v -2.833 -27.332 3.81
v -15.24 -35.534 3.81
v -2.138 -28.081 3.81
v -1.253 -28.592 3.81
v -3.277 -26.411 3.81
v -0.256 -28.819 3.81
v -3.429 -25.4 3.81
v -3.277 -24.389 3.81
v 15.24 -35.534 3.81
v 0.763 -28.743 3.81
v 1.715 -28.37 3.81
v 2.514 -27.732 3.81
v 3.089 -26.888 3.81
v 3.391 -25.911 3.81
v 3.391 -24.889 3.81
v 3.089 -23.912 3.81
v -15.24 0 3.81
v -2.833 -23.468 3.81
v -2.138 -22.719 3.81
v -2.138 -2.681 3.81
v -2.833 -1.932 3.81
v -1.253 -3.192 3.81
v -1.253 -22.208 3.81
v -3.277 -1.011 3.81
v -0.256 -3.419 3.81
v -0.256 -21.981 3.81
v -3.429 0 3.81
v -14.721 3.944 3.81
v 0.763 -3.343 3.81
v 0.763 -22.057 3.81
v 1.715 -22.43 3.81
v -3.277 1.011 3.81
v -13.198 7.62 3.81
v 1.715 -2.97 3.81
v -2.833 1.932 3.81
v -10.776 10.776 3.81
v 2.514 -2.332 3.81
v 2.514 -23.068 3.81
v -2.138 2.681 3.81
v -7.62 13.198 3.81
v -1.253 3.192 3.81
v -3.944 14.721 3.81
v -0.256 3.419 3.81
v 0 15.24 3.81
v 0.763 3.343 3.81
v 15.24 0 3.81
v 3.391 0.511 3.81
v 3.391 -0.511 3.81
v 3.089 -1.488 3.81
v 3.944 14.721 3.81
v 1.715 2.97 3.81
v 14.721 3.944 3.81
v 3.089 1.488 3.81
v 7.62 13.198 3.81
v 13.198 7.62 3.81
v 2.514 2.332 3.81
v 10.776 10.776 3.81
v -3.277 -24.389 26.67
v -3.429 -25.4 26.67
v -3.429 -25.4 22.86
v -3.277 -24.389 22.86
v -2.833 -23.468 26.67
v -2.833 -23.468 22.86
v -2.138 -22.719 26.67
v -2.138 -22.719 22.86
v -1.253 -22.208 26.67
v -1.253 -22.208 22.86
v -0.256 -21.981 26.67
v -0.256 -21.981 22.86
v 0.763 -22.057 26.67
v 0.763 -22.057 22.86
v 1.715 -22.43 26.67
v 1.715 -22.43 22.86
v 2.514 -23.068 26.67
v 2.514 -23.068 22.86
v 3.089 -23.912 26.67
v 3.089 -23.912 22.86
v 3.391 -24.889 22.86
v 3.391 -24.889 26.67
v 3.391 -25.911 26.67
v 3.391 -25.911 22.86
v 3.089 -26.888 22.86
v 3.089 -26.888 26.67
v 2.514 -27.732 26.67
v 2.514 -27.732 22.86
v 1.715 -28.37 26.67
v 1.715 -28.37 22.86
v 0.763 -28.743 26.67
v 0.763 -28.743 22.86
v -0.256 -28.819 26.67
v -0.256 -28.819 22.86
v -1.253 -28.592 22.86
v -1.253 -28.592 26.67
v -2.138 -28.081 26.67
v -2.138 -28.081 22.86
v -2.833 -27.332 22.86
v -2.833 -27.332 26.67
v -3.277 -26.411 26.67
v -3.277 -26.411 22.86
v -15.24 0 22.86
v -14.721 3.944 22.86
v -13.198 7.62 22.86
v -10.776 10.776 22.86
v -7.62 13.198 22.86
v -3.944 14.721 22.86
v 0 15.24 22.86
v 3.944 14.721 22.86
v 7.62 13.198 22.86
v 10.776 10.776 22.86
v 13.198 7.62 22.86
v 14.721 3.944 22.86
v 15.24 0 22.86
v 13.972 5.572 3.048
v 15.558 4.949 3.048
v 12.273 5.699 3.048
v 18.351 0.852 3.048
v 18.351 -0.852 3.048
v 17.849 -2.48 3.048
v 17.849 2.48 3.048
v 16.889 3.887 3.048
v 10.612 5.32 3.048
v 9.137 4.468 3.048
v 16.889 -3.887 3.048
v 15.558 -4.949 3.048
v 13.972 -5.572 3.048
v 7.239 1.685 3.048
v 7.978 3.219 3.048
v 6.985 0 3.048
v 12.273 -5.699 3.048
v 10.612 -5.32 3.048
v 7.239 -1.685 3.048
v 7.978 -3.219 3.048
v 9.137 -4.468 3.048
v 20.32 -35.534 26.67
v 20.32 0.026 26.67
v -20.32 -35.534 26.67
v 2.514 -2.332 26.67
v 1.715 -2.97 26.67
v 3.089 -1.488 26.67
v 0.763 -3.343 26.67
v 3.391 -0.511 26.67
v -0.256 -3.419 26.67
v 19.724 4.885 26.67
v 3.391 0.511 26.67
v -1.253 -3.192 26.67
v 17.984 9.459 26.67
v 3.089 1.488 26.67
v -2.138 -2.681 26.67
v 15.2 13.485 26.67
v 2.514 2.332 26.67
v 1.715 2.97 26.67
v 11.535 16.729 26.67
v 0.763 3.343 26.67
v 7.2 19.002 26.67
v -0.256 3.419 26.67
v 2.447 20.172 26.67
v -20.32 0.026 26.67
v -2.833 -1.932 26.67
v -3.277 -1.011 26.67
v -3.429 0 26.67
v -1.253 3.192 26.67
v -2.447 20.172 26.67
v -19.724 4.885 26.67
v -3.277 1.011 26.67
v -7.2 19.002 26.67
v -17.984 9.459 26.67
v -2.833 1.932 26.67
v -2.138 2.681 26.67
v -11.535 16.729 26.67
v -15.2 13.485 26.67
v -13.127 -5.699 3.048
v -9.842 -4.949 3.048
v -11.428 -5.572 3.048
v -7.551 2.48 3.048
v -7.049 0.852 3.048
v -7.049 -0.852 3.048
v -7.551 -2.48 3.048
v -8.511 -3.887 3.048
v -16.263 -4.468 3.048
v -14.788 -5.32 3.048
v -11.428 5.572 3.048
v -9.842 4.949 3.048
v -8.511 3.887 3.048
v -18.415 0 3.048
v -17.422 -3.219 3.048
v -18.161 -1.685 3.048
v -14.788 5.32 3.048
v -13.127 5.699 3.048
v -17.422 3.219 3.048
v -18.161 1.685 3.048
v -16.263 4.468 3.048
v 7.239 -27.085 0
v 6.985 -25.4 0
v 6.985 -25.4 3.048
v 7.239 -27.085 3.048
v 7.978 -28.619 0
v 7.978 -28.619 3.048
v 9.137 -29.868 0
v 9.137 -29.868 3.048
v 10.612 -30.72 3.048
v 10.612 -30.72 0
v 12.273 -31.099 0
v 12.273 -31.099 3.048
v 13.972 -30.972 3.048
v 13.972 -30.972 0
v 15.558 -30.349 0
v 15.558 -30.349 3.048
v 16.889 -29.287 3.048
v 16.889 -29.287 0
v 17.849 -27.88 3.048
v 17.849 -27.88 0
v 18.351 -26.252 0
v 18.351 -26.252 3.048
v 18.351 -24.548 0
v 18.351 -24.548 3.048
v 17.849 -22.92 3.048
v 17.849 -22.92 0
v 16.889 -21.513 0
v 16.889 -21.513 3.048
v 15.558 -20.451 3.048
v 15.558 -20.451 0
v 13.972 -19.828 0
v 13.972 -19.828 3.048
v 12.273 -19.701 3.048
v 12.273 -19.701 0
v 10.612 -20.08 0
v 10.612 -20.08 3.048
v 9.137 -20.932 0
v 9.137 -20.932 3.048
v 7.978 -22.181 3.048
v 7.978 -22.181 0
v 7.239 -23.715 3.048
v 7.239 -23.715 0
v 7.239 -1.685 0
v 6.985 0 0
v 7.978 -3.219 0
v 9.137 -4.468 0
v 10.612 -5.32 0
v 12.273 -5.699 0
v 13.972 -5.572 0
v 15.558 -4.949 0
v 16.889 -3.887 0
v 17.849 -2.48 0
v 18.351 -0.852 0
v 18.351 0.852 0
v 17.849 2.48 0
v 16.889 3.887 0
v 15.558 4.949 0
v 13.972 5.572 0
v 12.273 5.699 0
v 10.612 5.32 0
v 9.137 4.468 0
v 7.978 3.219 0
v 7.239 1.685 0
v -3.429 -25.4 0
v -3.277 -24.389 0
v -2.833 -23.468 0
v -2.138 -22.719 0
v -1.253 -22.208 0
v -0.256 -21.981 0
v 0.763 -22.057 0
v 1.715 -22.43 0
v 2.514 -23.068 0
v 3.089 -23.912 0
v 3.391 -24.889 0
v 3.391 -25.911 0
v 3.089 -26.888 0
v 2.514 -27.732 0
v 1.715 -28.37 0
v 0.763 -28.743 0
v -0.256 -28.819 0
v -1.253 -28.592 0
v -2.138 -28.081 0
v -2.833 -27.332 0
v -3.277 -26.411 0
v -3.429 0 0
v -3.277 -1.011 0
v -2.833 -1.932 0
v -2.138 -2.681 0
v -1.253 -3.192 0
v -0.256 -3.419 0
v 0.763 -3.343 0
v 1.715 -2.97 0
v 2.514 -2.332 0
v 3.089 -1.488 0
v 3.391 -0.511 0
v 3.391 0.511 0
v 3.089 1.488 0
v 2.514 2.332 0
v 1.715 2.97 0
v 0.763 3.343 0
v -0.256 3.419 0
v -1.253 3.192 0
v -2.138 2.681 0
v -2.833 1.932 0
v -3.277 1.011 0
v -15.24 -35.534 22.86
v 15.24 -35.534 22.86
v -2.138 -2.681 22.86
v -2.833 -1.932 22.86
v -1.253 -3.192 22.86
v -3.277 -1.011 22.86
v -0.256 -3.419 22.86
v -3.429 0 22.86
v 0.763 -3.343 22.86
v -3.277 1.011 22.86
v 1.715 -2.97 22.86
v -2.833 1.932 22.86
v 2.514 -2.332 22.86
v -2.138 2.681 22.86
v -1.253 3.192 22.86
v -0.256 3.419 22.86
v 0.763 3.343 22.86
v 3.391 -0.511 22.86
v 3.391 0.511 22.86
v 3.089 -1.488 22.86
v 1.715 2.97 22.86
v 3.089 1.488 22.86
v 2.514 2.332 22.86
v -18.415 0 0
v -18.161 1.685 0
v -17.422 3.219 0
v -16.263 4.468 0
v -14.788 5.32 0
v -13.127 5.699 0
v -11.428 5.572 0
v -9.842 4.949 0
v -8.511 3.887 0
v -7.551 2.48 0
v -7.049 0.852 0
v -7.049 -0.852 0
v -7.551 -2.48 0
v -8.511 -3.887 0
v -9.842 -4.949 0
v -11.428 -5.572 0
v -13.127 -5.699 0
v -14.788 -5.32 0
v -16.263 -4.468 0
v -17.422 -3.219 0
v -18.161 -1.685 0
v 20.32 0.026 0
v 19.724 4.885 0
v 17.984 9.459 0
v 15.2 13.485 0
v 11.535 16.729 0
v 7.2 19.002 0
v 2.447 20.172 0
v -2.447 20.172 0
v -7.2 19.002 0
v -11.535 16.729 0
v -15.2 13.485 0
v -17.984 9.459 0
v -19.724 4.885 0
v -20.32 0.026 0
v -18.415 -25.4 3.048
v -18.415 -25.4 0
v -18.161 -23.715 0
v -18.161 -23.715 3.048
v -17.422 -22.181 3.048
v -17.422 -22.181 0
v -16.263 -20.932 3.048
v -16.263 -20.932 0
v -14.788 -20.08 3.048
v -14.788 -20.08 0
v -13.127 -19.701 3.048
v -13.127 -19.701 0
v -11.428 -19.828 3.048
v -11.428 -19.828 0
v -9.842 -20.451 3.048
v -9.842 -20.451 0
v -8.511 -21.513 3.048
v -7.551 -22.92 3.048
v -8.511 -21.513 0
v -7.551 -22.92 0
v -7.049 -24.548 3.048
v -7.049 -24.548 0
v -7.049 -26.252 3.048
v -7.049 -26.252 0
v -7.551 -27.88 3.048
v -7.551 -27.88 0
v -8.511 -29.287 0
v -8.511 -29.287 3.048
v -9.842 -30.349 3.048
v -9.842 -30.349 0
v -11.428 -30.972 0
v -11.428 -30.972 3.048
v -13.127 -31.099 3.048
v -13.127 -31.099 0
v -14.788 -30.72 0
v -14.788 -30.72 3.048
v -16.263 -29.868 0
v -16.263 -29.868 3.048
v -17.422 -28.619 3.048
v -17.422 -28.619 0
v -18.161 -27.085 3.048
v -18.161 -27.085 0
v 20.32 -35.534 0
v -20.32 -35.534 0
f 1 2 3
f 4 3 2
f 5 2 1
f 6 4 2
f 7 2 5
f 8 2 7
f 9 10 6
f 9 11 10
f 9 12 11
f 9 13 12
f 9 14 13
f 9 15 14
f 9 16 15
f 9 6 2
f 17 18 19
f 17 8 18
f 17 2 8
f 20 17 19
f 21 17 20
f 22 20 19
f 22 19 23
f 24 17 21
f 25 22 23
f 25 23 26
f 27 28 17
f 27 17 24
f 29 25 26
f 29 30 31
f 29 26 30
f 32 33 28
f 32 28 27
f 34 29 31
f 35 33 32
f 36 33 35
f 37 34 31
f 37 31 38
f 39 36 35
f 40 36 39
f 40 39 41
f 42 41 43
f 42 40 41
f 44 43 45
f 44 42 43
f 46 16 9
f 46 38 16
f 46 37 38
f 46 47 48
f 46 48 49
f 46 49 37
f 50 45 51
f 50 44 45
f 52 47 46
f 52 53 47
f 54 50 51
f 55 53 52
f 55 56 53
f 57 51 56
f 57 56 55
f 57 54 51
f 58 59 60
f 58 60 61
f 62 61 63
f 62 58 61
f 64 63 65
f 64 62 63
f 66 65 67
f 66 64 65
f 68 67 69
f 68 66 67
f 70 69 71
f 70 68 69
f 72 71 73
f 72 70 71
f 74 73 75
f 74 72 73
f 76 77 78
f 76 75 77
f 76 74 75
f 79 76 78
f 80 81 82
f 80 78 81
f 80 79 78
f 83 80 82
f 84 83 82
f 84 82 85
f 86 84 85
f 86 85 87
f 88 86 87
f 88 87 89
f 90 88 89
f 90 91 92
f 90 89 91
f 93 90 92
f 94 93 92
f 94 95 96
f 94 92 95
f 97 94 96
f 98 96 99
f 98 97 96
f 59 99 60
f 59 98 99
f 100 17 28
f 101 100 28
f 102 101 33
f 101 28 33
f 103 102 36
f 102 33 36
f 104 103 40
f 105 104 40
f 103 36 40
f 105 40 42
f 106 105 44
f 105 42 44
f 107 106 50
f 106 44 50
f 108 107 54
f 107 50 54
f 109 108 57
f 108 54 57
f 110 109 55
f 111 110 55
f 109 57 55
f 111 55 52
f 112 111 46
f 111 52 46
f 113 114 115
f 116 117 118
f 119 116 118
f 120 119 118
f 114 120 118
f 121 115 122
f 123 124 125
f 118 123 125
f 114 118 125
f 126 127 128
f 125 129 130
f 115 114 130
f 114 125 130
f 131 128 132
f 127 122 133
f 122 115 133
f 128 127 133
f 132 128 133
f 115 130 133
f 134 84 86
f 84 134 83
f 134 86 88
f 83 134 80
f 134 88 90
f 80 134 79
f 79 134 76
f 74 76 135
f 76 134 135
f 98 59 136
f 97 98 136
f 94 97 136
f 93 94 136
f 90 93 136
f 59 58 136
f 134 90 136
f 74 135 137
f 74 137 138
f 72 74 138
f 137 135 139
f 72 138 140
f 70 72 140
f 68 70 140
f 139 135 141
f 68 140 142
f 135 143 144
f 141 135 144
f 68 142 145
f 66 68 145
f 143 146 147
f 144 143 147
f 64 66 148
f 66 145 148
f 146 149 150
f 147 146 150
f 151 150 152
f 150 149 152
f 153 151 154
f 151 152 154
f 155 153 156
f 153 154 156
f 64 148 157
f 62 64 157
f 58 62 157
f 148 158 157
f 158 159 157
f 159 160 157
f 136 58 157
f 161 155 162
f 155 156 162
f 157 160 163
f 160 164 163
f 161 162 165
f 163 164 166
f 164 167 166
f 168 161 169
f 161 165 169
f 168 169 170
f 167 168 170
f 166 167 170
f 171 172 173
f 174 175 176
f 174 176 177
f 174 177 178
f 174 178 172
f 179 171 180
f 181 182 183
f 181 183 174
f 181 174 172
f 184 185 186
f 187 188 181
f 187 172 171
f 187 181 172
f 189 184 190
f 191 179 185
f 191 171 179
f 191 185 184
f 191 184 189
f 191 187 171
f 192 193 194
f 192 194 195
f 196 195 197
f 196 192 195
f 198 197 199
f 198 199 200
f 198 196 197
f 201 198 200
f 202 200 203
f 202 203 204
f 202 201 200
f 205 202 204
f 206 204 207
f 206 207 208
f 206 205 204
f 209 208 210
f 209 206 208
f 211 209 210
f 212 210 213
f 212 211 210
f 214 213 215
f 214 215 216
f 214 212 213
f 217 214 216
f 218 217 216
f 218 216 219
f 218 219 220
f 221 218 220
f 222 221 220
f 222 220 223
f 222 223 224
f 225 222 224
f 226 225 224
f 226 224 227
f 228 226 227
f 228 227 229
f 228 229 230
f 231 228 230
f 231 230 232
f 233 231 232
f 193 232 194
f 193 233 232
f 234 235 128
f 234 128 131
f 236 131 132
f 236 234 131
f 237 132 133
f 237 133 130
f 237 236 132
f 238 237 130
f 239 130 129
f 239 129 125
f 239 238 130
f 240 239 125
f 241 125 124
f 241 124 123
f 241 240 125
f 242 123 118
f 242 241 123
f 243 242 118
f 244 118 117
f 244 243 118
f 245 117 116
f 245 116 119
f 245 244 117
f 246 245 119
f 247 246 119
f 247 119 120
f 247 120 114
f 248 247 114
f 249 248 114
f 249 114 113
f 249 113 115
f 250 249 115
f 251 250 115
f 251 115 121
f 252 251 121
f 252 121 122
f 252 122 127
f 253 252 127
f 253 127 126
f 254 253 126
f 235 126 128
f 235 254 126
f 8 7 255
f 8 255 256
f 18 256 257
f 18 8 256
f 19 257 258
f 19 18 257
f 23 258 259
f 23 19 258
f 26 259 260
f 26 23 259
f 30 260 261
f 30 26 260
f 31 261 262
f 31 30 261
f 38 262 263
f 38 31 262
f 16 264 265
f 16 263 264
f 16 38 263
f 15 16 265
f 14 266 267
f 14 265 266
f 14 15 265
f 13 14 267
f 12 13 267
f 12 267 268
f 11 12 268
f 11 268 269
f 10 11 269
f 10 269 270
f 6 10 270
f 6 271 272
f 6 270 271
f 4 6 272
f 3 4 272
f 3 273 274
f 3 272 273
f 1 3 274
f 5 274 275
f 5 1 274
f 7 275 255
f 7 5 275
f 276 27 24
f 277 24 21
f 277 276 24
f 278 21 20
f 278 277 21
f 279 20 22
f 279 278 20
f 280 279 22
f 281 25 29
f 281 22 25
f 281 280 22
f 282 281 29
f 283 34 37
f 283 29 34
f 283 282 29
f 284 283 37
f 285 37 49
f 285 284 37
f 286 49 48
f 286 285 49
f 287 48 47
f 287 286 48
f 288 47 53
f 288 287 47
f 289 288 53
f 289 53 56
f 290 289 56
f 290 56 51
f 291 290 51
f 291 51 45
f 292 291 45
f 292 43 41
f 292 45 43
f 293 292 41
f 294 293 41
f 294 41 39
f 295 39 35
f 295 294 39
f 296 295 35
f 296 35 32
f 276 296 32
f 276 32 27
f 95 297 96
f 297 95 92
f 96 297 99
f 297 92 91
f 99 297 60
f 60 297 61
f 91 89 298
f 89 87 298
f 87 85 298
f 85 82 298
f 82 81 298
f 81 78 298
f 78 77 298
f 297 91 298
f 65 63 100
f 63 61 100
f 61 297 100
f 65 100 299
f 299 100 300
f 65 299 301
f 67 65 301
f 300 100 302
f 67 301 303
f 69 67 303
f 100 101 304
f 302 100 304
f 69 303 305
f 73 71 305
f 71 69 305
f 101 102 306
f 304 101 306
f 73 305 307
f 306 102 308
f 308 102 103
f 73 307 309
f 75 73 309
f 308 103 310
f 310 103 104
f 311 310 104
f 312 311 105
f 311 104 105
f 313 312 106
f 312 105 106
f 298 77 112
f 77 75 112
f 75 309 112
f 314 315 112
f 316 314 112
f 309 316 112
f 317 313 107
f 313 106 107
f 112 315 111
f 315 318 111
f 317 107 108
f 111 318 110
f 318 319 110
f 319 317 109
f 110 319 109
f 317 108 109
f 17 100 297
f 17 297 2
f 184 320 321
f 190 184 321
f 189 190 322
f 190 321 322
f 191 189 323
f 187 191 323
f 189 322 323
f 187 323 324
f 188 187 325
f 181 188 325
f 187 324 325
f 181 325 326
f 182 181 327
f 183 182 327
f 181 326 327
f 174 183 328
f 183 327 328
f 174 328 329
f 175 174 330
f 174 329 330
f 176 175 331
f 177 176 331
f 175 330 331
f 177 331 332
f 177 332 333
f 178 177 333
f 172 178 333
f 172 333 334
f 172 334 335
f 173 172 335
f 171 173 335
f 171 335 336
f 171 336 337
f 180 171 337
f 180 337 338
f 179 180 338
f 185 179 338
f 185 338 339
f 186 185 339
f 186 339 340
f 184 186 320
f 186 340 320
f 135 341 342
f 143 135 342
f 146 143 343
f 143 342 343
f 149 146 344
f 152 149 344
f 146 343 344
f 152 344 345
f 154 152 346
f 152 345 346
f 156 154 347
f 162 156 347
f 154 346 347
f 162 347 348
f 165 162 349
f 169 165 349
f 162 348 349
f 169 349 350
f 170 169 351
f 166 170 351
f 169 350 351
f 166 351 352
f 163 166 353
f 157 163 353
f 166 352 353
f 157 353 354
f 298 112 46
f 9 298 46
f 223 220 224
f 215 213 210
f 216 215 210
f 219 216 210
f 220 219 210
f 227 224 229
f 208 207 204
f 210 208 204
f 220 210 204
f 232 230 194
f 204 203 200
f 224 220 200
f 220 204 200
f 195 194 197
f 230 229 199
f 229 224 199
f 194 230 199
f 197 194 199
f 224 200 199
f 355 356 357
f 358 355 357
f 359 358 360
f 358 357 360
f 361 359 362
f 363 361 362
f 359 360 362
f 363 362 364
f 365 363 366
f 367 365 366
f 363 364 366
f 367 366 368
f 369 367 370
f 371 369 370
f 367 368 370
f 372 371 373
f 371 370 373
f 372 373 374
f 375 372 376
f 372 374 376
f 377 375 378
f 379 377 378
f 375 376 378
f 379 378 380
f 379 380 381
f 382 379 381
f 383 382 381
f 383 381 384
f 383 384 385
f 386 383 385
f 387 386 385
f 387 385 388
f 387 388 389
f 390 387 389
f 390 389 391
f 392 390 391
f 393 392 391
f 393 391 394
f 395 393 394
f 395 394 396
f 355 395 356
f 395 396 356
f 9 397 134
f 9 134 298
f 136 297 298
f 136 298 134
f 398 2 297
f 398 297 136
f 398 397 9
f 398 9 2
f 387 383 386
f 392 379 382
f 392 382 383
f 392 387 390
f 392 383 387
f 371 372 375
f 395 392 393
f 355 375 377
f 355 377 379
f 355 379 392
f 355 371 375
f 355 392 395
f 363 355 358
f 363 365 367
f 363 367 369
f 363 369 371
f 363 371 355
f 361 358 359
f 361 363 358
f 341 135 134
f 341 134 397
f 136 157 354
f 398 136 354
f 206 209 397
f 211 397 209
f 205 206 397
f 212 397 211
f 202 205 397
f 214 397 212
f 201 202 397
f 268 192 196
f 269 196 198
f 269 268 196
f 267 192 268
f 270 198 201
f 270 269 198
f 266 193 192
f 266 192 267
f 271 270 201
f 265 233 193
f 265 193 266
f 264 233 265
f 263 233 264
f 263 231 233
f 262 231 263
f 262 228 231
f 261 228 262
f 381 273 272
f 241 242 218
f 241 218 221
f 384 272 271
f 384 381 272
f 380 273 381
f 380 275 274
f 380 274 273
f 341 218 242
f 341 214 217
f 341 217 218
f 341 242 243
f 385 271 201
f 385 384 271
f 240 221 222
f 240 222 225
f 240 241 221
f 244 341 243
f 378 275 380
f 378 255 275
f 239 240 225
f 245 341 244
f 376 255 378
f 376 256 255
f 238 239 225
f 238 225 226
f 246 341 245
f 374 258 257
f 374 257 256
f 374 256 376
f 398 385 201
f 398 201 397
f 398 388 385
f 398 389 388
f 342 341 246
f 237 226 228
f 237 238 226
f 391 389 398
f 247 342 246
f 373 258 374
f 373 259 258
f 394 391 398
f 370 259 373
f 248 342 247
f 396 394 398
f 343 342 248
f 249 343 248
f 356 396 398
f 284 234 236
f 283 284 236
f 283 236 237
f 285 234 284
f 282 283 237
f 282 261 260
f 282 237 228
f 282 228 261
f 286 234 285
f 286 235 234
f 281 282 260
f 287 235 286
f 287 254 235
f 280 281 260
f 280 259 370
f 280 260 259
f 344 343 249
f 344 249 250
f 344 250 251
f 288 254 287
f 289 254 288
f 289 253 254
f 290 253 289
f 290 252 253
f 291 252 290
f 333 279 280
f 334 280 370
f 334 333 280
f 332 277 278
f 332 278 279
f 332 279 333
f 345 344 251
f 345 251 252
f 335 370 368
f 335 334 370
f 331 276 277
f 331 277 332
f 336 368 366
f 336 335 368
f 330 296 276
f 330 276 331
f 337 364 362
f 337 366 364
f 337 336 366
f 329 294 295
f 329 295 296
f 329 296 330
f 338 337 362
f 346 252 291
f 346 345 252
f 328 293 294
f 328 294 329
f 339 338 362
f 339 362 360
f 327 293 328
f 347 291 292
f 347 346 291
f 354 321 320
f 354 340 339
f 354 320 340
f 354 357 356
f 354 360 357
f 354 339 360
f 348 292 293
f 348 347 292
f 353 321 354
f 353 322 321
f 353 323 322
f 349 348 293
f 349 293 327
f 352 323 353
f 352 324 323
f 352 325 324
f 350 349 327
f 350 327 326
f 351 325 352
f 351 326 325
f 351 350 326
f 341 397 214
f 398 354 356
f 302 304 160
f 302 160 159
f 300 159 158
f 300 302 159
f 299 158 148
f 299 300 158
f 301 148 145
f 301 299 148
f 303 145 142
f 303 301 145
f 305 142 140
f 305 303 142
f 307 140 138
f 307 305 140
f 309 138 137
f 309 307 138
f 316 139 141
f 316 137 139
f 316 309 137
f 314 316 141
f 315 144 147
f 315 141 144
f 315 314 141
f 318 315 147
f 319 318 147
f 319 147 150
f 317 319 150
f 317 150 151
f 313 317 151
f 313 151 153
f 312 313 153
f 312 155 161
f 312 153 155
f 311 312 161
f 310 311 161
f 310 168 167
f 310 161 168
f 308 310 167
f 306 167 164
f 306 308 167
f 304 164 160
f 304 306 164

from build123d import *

# Parameters (mm, degrees)
BOSS_EXTRUDE1_DEPTH      = 26.67
SKETCH3_W                = 40.639965772
SKETCH3_H                = 26.67
BOSS_EXTRUDE2_DEPTH      = 35.56
CUT_EXTRUDE3_START       = 3.81
CUT_EXTRUDE3_DEPTH       = 19.05
SKETCH9_W                = 30.48
SKETCH9_H                = 19.05
CUT_EXTRUDE4_DEPTH       = 35.533627808
CUT_EXTRUDE8_REACH       = 50.855
SKETCH10_R               = 3.429
SKETCH11_R               = 5.715
CUT_EXTRUDE9_DEPTH       = 3.048
SKETCH12_R               = 5.715
CUT_EXTRUDE10_DEPTH      = 3.048
SKETCH13_R               = 5.715
CUT_EXTRUDE11_DEPTH      = 3.048
CUT_EXTRUDE12_DEPTH      = 49.855187132
CUT_EXTRUDE12_DEPTH_BACK = 49.855187132
SKETCH16_R               = 3.429


with BuildPart() as part:
    # Sketch2 → Boss-Extrude1 (new body)
    with BuildSketch(Plane.XY):
        with BuildLine():
            Line((-20.319982886, 0.026372192), (20.319982886, 0.026372192))
            ThreePointArc((20.319982886, 0.026372192), (0, 20.32), (-20.319982886, 0.026372192))
        make_face()
    extrude(amount=BOSS_EXTRUDE1_DEPTH)

    # Sketch3 → Boss-Extrude2 (add)
    with BuildSketch(Plane(origin=(0, 0.026372192, 0), x_dir=(-1, 0, 0), z_dir=(0, -1, 0))):
        with Locations((0, -13.335)):
            Rectangle(SKETCH3_W, SKETCH3_H)
    extrude(amount=BOSS_EXTRUDE2_DEPTH)

    # Sketch8 → Cut-Extrude3 (cut)
    with BuildSketch(Plane.XY.offset(CUT_EXTRUDE3_START)):
        with BuildLine():
            Line((15.24, 0), (-15.24, 0))
            ThreePointArc((-15.24, 0), (0, 15.24), (15.24, 0))
        make_face()
    extrude(amount=CUT_EXTRUDE3_DEPTH, mode=Mode.SUBTRACT)

    # Sketch9 → Cut-Extrude4 (cut)
    with BuildSketch(Plane(origin=(0, 0, 0), x_dir=(1, 0, 0), z_dir=(0, 1, 0))):
        with Locations((0, -13.335)):
            Rectangle(SKETCH9_W, SKETCH9_H)
    extrude(amount=-CUT_EXTRUDE4_DEPTH, mode=Mode.SUBTRACT)

    # Cut-Extrude8: up to this face of the body (flat: up to its plane)
    cut_extrude8_end = Plane(part.part.faces().sort_by_distance((0, -9.587434333, 26.67))[0])
    # Sketch10 → Cut-Extrude8 (cut, up to the picked face)
    with BuildSketch(Plane.XY, mode=Mode.PRIVATE) as cut_extrude8_sk1:
        with Locations(Location((0, 0, 0), (0, 0, 180))):
            Circle(SKETCH10_R)
    cut_extrude8_tool1 = split(extrude(cut_extrude8_sk1.sketch, amount=CUT_EXTRUDE8_REACH, mode=Mode.PRIVATE), bisect_by=cut_extrude8_end, keep=Keep.BOTH, mode=Mode.PRIVATE)
    add(cut_extrude8_tool1.solids().sort_by(Axis((0, 0, 0), (0, 0, 1)))[0], mode=Mode.SUBTRACT)

    # Sketch11 → Cut-Extrude9 (cut)
    with BuildSketch(Plane.XY):
        with Locations(Location((12.7, 0, 0), (0, 0, 180))):
            Circle(SKETCH11_R)
    extrude(amount=CUT_EXTRUDE9_DEPTH, mode=Mode.SUBTRACT)

    # Sketch12 → Cut-Extrude10 (cut)
    with BuildSketch(Plane.XY):
        with Locations(Location((12.7, -25.4, 0), (0, 0, 180))):
            Circle(SKETCH12_R)
    extrude(amount=CUT_EXTRUDE10_DEPTH, mode=Mode.SUBTRACT)

    # Sketch13 → Cut-Extrude11 (cut)
    with BuildSketch(Plane(origin=(0, 0, 0), x_dir=(-1, 0, 0), z_dir=(0, 0, -1))):
        with Locations((12.7, 0)):
            Circle(SKETCH13_R)
        with Locations((12.7, -25.4)):
            Circle(SKETCH13_R)
    extrude(amount=-CUT_EXTRUDE11_DEPTH, mode=Mode.SUBTRACT)

    # Sketch16 → Cut-Extrude12 (cut, two sides: drawn at the far end of the back side and taken through both)
    with BuildSketch(Plane(origin=(0, 0, 0), x_dir=(-1, 0, 0), z_dir=(0, 0, -1)).offset(-CUT_EXTRUDE12_DEPTH_BACK)):
        with Locations((0, -25.4)):
            Circle(SKETCH16_R)
    extrude(amount=CUT_EXTRUDE12_DEPTH + CUT_EXTRUDE12_DEPTH_BACK, mode=Mode.SUBTRACT)


solid = part.part
